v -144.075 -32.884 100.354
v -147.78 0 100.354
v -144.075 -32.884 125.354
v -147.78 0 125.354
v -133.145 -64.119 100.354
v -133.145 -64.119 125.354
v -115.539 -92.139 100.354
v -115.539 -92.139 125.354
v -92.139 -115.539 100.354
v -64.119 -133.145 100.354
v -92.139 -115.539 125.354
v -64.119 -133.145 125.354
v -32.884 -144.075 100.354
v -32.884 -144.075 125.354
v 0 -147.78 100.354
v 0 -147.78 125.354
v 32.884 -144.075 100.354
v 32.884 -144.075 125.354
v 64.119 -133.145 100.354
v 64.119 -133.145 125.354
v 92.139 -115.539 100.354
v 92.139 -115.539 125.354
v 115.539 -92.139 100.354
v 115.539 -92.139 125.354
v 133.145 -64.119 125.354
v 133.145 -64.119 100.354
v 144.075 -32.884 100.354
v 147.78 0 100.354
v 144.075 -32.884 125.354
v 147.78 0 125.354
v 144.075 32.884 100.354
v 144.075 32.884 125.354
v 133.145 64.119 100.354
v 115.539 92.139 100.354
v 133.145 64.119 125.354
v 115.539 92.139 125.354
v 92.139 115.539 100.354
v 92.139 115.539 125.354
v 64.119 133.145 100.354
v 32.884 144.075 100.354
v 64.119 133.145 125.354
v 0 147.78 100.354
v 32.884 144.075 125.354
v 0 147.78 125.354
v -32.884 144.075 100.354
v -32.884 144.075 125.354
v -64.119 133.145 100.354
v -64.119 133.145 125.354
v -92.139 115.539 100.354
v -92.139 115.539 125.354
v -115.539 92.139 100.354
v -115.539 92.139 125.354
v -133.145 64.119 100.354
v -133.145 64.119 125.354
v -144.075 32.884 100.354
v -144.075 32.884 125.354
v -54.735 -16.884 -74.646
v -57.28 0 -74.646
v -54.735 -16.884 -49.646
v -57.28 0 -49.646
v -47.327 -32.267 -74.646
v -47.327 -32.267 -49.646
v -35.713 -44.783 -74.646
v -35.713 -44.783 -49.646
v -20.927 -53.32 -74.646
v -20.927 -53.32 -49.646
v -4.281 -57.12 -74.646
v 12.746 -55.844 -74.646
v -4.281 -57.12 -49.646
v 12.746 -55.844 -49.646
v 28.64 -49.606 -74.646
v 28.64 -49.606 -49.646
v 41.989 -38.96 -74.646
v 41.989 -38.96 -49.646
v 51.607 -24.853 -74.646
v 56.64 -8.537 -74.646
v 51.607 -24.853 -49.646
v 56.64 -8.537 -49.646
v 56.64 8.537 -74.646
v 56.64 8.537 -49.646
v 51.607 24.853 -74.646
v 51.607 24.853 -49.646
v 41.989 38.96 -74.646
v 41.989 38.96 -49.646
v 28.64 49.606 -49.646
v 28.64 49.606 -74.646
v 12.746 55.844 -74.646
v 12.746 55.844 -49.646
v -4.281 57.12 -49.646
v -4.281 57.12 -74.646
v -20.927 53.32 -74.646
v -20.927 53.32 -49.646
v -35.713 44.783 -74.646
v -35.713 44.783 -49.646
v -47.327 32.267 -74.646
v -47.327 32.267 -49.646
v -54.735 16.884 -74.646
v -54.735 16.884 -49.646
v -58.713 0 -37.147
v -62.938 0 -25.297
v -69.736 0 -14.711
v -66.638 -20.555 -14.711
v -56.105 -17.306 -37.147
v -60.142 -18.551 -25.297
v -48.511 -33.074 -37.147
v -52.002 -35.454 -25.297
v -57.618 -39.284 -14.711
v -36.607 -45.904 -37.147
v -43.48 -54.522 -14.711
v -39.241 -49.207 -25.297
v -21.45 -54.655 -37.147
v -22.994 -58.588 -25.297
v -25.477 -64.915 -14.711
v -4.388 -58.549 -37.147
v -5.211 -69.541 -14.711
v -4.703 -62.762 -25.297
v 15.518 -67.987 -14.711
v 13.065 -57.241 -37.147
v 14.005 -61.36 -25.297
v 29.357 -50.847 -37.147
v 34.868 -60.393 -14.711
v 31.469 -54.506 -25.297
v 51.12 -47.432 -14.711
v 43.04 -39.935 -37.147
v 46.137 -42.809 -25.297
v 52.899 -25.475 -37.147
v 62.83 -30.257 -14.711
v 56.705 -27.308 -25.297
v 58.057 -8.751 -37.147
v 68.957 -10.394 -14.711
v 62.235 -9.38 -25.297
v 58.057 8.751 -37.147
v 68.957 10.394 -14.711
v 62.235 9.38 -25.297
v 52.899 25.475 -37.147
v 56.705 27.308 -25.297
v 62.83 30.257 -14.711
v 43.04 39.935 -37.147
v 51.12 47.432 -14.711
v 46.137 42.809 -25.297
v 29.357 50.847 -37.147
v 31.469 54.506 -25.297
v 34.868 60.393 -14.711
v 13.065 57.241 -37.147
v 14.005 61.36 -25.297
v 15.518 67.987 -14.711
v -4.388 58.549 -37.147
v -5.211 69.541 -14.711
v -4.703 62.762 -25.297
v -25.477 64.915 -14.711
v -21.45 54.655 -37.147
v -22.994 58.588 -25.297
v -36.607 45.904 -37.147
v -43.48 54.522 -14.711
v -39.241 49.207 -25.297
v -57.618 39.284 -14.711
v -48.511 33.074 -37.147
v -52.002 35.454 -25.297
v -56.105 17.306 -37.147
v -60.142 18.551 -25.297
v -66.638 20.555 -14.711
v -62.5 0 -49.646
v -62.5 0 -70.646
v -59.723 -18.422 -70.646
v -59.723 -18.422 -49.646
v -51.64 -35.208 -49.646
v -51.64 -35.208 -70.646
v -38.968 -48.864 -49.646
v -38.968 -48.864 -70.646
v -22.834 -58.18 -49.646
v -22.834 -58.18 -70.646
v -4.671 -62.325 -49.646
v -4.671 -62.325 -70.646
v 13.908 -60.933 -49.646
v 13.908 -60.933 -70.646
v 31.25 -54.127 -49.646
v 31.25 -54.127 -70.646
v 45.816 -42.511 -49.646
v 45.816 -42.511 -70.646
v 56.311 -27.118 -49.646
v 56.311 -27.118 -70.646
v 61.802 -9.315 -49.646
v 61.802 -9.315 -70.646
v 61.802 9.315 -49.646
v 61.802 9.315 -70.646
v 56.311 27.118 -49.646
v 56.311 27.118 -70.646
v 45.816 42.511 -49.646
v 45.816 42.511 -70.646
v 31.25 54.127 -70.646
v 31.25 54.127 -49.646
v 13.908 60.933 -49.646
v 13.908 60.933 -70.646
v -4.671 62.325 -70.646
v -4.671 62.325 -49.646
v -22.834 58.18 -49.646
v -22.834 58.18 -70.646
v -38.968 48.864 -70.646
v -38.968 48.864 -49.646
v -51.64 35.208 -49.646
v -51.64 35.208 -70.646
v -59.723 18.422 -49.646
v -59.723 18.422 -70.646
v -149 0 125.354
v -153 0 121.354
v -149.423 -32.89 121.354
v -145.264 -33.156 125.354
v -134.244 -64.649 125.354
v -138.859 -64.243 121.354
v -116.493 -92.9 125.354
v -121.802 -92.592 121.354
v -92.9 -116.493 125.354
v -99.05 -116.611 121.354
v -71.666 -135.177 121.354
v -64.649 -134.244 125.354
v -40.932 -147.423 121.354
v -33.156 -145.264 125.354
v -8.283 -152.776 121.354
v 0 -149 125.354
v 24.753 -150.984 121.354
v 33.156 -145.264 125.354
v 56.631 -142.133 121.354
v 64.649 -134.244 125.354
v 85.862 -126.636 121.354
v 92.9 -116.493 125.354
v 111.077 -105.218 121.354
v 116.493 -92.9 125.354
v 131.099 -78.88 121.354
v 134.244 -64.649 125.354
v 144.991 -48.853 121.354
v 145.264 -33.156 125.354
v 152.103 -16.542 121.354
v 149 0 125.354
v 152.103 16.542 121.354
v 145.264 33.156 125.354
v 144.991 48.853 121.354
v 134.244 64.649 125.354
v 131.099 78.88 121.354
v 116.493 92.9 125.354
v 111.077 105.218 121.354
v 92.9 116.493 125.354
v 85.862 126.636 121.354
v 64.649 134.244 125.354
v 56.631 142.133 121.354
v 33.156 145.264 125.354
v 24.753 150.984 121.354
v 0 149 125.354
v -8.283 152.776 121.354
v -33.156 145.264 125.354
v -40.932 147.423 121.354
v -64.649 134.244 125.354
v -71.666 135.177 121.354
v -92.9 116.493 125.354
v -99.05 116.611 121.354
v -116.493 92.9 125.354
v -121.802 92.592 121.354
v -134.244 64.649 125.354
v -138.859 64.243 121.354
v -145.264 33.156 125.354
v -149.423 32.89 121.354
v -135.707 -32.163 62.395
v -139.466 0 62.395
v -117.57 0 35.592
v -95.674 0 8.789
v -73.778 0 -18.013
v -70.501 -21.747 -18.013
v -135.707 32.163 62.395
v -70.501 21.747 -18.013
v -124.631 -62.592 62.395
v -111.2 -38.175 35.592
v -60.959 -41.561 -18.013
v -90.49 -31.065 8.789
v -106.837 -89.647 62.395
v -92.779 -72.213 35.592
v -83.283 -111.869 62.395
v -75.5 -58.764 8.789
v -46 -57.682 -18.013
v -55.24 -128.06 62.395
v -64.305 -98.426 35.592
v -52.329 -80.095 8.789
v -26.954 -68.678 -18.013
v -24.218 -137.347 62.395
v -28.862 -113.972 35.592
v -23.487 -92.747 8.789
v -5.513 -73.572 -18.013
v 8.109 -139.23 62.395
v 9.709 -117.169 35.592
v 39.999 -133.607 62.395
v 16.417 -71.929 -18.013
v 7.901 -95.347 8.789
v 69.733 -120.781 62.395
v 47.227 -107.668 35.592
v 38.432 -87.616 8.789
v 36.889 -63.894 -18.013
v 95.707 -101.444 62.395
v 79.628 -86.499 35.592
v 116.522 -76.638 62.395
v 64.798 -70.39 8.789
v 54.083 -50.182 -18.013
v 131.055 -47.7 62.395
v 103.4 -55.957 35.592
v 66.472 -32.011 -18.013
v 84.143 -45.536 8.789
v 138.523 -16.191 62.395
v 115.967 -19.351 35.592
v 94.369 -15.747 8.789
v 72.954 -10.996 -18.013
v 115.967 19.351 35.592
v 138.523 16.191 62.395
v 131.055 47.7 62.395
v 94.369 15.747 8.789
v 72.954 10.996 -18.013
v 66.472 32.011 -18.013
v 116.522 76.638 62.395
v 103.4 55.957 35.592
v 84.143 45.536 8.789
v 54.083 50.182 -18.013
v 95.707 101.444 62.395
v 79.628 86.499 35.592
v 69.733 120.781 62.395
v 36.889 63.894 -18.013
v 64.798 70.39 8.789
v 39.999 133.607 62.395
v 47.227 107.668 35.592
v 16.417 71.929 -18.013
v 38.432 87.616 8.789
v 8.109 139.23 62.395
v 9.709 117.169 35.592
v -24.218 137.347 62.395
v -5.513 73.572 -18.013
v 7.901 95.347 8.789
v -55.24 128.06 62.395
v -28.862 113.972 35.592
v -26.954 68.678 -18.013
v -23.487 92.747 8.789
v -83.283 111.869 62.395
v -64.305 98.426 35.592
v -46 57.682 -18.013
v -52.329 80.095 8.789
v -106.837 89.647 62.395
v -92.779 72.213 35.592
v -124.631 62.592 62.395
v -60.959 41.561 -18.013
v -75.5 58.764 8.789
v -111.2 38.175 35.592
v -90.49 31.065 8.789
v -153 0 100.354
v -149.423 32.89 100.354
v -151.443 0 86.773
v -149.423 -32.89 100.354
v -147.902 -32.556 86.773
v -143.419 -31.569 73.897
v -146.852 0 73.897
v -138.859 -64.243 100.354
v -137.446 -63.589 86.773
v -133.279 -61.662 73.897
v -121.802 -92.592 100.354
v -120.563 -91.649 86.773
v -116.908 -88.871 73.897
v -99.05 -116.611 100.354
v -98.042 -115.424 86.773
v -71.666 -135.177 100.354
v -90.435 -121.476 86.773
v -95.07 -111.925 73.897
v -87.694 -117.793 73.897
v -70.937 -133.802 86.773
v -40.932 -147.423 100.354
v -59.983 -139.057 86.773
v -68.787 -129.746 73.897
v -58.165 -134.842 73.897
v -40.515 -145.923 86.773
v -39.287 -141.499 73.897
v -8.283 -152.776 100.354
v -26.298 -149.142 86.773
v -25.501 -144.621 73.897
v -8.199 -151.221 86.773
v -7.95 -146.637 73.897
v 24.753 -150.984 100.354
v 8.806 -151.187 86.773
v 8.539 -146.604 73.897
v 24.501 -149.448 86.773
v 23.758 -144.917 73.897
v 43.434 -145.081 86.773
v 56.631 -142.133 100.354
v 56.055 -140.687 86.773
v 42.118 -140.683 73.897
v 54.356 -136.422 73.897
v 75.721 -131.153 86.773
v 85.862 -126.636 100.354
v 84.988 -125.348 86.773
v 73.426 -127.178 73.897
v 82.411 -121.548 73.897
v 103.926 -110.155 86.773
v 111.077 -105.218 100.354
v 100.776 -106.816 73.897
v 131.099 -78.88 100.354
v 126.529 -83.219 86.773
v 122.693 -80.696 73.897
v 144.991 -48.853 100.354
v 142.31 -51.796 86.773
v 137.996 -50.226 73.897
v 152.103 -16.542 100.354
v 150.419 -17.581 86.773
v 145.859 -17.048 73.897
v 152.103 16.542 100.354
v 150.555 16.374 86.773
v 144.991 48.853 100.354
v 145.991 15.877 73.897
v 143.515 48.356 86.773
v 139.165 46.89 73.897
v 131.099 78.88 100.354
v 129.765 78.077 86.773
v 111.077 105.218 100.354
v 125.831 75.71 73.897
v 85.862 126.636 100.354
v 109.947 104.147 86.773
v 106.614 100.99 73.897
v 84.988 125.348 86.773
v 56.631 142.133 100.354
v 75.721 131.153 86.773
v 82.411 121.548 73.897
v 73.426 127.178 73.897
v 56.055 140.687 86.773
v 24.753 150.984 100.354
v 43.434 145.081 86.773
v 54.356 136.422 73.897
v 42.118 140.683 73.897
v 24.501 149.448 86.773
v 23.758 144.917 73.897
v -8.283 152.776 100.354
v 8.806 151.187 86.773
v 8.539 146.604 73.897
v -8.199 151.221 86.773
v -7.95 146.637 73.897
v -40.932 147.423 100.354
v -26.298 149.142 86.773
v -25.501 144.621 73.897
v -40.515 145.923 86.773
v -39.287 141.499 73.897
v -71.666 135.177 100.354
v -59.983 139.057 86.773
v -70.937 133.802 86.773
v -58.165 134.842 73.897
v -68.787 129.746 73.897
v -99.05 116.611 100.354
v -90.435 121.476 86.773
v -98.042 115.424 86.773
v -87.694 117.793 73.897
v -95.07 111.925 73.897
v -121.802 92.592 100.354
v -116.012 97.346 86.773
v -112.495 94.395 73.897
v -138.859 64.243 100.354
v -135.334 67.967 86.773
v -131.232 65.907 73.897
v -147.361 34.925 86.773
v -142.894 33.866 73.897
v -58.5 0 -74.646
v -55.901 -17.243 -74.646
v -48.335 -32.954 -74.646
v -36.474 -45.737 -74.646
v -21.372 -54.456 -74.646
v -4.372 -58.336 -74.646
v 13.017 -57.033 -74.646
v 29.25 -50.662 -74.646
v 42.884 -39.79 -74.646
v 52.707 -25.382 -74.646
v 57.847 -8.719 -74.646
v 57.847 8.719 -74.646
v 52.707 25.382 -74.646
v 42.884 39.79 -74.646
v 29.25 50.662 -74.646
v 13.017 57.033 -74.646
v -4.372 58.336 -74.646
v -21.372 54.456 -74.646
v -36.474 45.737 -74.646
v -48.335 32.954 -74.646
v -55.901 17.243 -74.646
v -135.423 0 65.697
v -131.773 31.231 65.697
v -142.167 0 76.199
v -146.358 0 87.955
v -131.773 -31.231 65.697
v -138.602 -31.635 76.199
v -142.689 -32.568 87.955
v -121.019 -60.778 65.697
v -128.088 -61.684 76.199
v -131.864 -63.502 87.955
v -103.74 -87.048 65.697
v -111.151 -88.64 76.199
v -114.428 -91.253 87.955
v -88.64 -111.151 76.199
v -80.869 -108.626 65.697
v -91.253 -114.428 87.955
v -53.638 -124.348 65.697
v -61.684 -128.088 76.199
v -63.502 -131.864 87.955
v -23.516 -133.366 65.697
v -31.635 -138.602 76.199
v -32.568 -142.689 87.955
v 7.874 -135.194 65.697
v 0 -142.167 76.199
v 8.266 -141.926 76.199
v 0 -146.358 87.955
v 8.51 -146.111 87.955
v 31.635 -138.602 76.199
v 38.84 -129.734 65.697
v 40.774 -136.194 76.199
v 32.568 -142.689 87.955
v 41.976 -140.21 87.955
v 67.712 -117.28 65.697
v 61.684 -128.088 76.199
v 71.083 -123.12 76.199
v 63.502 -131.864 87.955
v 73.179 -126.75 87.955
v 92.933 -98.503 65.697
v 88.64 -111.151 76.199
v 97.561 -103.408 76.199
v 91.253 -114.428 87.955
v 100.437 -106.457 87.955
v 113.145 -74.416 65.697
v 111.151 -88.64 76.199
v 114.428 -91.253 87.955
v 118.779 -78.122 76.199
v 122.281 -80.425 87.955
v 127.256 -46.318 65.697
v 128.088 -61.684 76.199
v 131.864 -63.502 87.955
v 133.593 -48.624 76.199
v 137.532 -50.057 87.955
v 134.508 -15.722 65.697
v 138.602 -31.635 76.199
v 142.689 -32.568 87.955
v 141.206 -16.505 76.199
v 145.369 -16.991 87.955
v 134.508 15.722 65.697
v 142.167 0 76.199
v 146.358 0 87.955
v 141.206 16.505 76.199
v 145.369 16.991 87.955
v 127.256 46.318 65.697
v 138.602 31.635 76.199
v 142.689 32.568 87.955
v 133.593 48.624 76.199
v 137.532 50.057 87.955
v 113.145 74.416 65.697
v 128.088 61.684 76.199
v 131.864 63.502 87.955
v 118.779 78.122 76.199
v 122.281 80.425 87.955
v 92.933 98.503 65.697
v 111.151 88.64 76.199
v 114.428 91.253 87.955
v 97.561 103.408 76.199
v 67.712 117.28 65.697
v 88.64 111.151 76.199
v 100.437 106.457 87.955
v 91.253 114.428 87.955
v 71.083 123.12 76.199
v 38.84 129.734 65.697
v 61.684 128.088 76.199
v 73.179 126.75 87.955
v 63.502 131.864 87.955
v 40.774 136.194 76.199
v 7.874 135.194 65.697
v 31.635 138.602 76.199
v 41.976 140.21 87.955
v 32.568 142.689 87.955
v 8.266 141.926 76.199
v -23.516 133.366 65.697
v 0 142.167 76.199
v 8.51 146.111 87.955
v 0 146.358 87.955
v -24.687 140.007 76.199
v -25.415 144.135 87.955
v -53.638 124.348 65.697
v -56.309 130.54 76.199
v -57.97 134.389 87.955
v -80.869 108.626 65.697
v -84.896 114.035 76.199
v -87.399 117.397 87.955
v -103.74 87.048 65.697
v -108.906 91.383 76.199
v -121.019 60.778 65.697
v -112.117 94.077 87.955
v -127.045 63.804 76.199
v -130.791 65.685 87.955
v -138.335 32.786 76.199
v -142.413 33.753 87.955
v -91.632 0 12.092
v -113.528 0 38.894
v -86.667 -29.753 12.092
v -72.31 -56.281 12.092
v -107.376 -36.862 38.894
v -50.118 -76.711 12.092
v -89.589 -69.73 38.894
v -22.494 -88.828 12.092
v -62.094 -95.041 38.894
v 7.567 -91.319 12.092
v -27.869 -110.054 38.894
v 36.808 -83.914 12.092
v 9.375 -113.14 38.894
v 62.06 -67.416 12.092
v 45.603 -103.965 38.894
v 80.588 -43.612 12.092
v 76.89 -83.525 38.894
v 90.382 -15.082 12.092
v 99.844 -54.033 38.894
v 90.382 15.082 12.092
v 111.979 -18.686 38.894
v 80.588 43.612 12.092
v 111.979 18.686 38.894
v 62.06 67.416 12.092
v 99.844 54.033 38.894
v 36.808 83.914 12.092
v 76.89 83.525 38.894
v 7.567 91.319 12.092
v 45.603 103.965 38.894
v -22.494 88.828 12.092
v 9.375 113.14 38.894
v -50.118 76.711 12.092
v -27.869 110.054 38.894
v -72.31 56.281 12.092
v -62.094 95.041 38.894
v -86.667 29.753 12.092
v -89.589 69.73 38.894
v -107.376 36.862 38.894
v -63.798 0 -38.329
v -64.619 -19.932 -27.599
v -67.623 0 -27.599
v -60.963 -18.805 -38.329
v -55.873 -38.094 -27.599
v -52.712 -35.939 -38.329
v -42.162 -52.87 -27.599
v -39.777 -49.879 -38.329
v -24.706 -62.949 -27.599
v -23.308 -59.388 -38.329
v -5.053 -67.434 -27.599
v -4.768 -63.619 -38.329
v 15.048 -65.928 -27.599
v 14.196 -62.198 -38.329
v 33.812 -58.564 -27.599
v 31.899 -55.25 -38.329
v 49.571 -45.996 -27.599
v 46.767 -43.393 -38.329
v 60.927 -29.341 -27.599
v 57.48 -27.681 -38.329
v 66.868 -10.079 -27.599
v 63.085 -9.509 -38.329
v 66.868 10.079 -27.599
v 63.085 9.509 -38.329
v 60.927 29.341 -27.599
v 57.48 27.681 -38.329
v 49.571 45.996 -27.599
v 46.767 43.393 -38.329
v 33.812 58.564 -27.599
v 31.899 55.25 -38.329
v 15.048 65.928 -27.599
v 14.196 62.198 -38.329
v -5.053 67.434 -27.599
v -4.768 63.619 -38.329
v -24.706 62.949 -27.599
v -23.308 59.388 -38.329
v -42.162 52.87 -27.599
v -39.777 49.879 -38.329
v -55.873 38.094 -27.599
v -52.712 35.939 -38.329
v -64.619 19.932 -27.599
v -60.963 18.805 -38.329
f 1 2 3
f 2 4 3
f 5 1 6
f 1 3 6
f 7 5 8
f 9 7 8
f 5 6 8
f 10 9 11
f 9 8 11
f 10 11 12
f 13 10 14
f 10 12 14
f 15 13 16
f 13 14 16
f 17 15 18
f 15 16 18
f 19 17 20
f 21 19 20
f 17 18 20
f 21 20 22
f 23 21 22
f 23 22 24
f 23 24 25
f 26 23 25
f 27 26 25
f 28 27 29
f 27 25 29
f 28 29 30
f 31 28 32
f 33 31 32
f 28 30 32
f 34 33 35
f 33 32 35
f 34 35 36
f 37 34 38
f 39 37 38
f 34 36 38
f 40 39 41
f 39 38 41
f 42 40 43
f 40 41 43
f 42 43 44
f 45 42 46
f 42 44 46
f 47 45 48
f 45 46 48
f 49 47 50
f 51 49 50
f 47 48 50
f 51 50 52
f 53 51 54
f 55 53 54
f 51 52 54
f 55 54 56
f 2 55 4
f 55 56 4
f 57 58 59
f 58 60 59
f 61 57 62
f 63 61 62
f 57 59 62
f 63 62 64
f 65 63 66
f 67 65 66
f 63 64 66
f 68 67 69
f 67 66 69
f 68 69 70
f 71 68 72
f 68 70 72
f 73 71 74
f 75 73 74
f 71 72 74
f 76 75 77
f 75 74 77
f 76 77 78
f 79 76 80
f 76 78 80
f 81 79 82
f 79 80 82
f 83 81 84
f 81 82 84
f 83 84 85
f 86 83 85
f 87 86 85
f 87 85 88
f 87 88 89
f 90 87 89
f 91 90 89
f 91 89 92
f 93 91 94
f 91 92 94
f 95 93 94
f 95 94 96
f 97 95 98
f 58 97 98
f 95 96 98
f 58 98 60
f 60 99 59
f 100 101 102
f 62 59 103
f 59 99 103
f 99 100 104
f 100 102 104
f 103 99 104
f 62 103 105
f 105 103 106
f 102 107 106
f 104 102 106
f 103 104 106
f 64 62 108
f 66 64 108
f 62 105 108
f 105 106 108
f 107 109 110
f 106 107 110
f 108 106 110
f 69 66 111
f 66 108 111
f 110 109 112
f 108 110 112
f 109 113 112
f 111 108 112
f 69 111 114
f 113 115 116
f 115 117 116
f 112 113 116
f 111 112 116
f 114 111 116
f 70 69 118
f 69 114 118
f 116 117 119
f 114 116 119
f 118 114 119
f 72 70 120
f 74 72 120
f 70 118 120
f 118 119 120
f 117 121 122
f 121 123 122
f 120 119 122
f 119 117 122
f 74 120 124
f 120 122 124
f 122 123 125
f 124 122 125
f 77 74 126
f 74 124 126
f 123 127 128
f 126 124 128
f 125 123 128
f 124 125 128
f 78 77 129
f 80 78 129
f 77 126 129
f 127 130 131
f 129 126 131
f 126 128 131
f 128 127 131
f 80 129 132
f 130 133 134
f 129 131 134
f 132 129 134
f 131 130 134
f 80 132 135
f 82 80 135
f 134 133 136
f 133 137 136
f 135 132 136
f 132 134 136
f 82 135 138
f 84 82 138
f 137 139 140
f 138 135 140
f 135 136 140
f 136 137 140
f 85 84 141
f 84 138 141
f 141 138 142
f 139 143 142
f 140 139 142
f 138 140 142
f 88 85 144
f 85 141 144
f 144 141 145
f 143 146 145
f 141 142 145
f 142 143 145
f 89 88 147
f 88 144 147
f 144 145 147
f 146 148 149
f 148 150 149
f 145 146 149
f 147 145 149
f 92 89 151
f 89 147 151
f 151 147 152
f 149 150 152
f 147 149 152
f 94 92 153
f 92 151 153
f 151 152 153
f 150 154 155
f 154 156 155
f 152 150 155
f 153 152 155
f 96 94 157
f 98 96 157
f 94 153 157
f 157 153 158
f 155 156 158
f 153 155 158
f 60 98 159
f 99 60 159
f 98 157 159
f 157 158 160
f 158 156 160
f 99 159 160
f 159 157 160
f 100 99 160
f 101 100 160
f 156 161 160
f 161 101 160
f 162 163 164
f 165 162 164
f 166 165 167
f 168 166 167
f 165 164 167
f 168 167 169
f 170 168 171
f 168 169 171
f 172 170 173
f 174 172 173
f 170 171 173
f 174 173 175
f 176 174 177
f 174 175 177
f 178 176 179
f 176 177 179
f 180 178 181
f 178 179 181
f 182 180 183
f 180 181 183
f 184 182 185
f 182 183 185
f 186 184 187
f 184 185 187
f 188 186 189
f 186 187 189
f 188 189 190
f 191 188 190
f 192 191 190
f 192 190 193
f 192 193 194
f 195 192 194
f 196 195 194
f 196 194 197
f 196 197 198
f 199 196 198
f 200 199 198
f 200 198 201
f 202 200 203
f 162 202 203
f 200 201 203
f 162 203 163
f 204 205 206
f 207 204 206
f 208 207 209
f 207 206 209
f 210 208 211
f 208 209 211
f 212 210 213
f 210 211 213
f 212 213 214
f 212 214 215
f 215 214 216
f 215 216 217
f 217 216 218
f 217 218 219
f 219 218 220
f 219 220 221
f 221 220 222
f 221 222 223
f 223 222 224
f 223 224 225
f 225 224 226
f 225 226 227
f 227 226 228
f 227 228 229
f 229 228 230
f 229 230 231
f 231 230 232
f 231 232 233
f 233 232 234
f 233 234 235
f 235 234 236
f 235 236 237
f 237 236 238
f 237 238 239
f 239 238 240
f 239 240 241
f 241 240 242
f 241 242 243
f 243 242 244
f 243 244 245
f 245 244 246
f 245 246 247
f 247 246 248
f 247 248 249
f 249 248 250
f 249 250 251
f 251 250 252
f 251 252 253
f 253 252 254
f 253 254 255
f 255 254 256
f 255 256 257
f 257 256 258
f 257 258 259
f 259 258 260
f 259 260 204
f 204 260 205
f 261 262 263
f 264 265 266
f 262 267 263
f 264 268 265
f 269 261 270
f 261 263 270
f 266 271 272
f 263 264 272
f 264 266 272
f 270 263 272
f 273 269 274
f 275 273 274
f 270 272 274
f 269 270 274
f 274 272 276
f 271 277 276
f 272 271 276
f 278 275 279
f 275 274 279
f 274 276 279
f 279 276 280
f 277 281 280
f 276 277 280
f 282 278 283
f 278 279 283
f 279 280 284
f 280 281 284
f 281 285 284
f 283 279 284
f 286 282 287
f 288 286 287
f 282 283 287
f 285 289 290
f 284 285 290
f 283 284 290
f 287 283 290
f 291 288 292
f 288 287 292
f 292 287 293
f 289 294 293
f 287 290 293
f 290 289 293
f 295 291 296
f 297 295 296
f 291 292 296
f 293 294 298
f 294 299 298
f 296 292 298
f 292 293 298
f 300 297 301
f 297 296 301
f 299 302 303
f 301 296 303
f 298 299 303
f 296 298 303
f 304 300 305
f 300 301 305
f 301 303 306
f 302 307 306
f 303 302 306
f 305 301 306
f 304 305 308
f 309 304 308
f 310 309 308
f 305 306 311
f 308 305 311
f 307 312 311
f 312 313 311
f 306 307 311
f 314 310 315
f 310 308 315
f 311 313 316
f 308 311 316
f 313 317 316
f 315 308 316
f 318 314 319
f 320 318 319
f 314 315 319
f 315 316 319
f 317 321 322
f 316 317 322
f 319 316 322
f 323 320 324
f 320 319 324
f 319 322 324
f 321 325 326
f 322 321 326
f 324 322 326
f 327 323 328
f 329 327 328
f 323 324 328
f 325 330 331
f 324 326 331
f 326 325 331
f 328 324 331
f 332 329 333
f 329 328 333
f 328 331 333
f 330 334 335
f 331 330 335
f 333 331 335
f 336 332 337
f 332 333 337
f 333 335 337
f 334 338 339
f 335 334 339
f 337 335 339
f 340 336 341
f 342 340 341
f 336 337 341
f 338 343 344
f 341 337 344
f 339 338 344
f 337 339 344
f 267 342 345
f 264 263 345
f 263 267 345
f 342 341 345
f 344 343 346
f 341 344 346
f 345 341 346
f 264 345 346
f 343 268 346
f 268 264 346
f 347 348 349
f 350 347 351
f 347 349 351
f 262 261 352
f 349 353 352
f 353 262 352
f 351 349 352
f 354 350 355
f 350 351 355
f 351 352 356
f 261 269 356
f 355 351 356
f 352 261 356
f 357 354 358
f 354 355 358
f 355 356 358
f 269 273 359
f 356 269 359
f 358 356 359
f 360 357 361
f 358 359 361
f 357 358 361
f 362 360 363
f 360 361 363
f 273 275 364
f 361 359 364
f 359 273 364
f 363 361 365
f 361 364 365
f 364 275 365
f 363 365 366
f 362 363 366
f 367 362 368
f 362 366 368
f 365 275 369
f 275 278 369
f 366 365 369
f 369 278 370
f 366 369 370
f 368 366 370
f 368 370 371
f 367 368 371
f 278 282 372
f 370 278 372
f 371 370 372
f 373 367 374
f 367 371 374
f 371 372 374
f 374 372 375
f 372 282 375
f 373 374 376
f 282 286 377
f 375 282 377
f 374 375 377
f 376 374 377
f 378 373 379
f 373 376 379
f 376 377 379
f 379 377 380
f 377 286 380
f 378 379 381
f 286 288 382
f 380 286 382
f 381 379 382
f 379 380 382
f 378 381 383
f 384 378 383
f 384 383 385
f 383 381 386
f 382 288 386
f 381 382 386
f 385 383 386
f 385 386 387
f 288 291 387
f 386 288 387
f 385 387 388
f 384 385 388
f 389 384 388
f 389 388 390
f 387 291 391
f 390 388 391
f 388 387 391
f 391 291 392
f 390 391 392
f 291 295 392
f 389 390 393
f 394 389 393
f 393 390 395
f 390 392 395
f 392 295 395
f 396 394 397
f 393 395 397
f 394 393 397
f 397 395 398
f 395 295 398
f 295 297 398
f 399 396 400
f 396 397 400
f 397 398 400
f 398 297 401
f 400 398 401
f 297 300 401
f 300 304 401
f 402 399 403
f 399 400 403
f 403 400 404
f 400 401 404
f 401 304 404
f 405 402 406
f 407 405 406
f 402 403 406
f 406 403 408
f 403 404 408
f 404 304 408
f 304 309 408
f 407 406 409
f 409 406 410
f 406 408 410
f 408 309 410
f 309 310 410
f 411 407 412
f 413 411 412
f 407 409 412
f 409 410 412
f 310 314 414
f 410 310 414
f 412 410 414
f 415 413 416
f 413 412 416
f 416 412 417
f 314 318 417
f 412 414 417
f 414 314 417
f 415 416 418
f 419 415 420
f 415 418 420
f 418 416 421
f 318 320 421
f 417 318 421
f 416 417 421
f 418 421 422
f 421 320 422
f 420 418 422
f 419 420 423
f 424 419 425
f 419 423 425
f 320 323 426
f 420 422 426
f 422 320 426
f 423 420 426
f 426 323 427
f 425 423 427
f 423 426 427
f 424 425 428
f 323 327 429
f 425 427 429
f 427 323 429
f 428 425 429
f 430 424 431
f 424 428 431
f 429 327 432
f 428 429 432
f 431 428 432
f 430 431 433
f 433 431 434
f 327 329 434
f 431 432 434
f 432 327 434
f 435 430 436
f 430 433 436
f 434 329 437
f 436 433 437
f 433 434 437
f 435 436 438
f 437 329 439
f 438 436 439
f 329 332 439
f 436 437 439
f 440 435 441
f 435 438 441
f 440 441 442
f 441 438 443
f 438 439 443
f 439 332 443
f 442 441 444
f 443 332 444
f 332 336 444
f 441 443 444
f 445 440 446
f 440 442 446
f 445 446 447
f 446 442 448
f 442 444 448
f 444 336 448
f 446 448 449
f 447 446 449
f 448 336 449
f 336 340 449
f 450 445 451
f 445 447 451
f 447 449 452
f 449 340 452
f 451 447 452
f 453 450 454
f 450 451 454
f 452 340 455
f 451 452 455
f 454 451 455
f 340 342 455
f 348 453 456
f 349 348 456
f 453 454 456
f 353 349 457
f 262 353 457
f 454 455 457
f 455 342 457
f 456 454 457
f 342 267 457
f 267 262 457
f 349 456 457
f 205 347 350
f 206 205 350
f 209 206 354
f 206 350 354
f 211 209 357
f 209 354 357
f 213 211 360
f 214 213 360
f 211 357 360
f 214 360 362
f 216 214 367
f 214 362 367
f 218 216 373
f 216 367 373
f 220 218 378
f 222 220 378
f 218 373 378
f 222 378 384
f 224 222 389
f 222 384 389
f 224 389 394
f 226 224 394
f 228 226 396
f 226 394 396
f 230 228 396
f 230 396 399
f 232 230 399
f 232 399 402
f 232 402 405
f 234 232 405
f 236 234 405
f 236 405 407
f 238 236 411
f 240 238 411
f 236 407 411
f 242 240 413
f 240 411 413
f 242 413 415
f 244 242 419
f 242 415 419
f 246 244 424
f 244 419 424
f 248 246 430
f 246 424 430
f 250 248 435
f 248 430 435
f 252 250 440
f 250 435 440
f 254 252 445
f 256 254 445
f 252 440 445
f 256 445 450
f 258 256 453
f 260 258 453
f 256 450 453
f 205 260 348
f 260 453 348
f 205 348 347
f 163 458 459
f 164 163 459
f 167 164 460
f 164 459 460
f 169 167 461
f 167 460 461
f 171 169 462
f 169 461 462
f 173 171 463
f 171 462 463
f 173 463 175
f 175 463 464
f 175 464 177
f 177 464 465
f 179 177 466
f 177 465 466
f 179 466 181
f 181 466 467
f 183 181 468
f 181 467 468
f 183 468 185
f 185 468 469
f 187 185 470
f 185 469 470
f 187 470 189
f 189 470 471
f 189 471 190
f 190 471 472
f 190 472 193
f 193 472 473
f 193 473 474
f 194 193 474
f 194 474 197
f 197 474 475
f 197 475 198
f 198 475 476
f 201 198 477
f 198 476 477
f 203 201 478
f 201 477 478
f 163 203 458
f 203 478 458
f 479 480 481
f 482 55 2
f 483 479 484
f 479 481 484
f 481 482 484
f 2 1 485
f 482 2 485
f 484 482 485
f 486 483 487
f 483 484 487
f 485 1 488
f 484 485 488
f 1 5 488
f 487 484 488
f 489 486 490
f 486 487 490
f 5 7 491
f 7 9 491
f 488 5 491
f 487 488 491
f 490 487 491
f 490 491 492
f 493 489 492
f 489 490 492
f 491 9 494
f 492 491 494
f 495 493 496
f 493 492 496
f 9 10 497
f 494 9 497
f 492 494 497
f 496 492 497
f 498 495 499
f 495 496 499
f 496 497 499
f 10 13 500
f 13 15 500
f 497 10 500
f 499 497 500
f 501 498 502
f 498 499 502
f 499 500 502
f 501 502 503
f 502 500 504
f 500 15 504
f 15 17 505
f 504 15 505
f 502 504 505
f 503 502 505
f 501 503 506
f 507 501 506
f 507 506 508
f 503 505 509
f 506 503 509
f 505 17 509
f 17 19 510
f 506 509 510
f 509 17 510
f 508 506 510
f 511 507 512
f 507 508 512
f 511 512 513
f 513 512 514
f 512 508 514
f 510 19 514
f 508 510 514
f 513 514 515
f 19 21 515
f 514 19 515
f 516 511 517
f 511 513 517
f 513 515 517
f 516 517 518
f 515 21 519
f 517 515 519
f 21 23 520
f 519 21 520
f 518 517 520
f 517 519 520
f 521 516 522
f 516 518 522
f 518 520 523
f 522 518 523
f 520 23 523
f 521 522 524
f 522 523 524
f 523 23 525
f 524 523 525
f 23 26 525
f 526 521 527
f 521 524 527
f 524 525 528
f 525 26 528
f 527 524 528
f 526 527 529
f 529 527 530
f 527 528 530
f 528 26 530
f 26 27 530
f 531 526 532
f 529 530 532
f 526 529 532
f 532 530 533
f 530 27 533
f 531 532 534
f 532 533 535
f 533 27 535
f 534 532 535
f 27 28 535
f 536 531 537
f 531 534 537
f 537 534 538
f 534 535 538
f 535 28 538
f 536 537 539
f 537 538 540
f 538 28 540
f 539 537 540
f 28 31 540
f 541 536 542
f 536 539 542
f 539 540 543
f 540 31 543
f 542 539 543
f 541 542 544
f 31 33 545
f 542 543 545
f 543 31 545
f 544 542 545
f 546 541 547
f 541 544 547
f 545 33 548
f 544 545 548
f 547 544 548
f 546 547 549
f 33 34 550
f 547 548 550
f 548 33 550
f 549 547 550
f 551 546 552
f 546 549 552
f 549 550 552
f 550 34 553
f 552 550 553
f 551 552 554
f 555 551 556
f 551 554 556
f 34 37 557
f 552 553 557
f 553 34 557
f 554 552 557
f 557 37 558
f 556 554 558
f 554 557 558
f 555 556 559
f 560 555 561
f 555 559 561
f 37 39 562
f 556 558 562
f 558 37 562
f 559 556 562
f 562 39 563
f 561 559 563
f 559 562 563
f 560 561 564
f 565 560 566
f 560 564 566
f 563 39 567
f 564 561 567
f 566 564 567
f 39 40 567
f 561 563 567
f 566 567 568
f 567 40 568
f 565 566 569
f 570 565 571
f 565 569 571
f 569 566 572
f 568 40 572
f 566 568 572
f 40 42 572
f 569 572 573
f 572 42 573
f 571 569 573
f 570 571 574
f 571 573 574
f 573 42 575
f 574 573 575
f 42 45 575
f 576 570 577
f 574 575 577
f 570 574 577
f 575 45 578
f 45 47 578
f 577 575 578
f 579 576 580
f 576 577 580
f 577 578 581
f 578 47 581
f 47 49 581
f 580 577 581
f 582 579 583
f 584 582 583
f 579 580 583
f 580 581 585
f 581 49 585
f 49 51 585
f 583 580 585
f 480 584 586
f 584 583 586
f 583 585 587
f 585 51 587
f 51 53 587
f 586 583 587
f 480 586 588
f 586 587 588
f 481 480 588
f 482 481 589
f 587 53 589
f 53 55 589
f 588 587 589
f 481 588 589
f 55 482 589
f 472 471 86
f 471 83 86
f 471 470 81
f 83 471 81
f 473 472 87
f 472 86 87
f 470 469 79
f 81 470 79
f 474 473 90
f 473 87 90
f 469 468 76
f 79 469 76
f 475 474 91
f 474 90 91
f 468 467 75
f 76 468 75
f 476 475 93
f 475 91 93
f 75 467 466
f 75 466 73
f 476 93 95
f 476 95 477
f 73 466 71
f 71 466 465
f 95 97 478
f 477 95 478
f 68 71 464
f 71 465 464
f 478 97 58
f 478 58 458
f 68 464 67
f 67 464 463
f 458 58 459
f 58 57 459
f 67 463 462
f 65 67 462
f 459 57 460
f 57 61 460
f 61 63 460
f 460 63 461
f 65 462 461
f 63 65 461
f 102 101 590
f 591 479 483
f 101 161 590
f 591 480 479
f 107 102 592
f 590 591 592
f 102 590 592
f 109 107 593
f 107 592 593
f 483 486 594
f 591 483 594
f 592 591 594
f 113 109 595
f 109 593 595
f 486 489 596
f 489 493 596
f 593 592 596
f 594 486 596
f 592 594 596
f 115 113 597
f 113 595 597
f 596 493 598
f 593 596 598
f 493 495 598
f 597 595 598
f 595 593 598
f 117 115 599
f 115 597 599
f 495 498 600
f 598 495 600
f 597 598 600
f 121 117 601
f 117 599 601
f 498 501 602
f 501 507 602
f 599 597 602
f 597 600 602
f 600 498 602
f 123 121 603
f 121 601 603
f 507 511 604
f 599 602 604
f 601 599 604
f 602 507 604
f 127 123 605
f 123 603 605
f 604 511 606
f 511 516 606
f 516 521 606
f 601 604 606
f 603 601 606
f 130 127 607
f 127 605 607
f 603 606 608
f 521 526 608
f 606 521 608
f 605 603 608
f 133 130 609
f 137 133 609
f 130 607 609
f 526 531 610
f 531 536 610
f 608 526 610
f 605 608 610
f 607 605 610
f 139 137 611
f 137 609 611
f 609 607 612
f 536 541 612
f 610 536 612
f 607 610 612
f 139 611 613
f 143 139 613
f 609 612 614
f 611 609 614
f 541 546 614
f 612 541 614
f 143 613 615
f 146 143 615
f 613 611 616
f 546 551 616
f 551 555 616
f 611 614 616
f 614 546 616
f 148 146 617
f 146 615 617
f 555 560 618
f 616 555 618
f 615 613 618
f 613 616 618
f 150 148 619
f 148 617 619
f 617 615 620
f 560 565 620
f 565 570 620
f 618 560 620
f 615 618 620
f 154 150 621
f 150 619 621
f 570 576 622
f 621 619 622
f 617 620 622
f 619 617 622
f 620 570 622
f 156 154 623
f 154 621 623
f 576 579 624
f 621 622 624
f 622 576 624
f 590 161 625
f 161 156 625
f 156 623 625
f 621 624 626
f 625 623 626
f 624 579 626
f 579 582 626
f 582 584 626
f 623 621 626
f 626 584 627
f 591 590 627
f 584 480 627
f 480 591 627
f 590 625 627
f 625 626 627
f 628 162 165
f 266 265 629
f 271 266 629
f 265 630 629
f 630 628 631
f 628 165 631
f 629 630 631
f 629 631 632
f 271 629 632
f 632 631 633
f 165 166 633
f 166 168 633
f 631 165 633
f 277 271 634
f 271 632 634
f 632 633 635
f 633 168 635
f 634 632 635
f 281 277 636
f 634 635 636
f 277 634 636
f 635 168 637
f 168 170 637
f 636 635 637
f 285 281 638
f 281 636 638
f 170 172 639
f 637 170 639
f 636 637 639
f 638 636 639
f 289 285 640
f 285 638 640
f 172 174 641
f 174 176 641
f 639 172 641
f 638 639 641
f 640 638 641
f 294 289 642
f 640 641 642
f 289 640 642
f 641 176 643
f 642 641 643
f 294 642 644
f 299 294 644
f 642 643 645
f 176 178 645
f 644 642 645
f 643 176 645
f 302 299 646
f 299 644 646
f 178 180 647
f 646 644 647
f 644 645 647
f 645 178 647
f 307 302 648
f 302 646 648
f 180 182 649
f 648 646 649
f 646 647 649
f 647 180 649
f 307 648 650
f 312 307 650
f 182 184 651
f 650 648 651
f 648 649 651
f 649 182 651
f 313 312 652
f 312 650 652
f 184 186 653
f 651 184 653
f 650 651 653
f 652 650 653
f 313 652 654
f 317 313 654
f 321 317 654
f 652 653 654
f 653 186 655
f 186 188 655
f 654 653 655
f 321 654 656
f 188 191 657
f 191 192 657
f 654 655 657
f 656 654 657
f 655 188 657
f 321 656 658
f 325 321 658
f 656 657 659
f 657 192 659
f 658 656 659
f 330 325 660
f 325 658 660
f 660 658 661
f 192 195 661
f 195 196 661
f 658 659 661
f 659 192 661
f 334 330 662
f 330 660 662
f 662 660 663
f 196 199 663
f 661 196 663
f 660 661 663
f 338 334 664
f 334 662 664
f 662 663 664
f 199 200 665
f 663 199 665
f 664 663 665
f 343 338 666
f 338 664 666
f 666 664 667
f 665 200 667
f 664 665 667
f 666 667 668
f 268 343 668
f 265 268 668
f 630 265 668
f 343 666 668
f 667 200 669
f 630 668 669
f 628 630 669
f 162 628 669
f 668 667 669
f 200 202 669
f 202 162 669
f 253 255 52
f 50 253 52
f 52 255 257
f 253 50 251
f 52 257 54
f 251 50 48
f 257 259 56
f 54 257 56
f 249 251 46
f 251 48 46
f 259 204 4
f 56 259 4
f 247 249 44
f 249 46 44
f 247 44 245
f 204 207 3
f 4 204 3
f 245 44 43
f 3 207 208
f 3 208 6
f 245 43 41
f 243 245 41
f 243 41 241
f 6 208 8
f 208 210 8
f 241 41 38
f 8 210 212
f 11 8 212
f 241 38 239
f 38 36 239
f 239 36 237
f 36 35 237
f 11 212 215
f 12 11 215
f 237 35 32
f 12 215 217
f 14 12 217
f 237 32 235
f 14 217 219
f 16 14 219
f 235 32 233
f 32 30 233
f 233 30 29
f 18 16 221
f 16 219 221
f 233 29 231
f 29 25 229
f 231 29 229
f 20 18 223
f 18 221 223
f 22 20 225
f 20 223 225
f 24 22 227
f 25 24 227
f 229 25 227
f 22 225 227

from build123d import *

# Parameters (mm, degrees)
F2_SIZE = 4


with BuildPart() as f1:
    # F0 (on Front) → F1 (revolve)
    with BuildSketch(Plane.XZ):
        with BuildLine():
            Line((-147.78, 125.353982), (-153, 125.353982))
            Line((-153, 125.353982), (-153, 100.353982))
            ThreePointArc((-153, 100.353982), (-149.515286, 80.203983), (-139.465919, 62.394551))
            Line((-139.465919, 62.394551), (-73.778401, -18.01316))
            ThreePointArc((-73.778401, -18.01316), (-65.403928, -32.854353), (-62.5, -49.646018))
            Line((-62.5, -49.646018), (-62.5, -74.646018))
            Line((-62.5, -74.646018), (-57.28, -74.646018))
            Line((-57.28, -74.646018), (-57.28, -49.646018))
            ThreePointArc((-57.28, -49.646018), (-60.487098, -31.101303), (-69.735866, -14.710689))
            Line((-69.735866, -14.710689), (-135.423384, 65.697021))
            ThreePointArc((-135.423384, 65.697021), (-144.598456, 81.957033), (-147.78, 100.353982))
            Line((-147.78, 100.353982), (-147.78, 125.353982))
        make_face()
    revolve(axis=Axis((0, 0, 32.767496), (0, 0, 1)))

    # F2
    f2_edges = [f1.edges().sort_by_distance(p)[0] for p in [
        (153, 0, 125.353982),
        (62.5, 0, -74.646018),
    ]]
    chamfer(f2_edges, length=F2_SIZE)


solid = f1.part
